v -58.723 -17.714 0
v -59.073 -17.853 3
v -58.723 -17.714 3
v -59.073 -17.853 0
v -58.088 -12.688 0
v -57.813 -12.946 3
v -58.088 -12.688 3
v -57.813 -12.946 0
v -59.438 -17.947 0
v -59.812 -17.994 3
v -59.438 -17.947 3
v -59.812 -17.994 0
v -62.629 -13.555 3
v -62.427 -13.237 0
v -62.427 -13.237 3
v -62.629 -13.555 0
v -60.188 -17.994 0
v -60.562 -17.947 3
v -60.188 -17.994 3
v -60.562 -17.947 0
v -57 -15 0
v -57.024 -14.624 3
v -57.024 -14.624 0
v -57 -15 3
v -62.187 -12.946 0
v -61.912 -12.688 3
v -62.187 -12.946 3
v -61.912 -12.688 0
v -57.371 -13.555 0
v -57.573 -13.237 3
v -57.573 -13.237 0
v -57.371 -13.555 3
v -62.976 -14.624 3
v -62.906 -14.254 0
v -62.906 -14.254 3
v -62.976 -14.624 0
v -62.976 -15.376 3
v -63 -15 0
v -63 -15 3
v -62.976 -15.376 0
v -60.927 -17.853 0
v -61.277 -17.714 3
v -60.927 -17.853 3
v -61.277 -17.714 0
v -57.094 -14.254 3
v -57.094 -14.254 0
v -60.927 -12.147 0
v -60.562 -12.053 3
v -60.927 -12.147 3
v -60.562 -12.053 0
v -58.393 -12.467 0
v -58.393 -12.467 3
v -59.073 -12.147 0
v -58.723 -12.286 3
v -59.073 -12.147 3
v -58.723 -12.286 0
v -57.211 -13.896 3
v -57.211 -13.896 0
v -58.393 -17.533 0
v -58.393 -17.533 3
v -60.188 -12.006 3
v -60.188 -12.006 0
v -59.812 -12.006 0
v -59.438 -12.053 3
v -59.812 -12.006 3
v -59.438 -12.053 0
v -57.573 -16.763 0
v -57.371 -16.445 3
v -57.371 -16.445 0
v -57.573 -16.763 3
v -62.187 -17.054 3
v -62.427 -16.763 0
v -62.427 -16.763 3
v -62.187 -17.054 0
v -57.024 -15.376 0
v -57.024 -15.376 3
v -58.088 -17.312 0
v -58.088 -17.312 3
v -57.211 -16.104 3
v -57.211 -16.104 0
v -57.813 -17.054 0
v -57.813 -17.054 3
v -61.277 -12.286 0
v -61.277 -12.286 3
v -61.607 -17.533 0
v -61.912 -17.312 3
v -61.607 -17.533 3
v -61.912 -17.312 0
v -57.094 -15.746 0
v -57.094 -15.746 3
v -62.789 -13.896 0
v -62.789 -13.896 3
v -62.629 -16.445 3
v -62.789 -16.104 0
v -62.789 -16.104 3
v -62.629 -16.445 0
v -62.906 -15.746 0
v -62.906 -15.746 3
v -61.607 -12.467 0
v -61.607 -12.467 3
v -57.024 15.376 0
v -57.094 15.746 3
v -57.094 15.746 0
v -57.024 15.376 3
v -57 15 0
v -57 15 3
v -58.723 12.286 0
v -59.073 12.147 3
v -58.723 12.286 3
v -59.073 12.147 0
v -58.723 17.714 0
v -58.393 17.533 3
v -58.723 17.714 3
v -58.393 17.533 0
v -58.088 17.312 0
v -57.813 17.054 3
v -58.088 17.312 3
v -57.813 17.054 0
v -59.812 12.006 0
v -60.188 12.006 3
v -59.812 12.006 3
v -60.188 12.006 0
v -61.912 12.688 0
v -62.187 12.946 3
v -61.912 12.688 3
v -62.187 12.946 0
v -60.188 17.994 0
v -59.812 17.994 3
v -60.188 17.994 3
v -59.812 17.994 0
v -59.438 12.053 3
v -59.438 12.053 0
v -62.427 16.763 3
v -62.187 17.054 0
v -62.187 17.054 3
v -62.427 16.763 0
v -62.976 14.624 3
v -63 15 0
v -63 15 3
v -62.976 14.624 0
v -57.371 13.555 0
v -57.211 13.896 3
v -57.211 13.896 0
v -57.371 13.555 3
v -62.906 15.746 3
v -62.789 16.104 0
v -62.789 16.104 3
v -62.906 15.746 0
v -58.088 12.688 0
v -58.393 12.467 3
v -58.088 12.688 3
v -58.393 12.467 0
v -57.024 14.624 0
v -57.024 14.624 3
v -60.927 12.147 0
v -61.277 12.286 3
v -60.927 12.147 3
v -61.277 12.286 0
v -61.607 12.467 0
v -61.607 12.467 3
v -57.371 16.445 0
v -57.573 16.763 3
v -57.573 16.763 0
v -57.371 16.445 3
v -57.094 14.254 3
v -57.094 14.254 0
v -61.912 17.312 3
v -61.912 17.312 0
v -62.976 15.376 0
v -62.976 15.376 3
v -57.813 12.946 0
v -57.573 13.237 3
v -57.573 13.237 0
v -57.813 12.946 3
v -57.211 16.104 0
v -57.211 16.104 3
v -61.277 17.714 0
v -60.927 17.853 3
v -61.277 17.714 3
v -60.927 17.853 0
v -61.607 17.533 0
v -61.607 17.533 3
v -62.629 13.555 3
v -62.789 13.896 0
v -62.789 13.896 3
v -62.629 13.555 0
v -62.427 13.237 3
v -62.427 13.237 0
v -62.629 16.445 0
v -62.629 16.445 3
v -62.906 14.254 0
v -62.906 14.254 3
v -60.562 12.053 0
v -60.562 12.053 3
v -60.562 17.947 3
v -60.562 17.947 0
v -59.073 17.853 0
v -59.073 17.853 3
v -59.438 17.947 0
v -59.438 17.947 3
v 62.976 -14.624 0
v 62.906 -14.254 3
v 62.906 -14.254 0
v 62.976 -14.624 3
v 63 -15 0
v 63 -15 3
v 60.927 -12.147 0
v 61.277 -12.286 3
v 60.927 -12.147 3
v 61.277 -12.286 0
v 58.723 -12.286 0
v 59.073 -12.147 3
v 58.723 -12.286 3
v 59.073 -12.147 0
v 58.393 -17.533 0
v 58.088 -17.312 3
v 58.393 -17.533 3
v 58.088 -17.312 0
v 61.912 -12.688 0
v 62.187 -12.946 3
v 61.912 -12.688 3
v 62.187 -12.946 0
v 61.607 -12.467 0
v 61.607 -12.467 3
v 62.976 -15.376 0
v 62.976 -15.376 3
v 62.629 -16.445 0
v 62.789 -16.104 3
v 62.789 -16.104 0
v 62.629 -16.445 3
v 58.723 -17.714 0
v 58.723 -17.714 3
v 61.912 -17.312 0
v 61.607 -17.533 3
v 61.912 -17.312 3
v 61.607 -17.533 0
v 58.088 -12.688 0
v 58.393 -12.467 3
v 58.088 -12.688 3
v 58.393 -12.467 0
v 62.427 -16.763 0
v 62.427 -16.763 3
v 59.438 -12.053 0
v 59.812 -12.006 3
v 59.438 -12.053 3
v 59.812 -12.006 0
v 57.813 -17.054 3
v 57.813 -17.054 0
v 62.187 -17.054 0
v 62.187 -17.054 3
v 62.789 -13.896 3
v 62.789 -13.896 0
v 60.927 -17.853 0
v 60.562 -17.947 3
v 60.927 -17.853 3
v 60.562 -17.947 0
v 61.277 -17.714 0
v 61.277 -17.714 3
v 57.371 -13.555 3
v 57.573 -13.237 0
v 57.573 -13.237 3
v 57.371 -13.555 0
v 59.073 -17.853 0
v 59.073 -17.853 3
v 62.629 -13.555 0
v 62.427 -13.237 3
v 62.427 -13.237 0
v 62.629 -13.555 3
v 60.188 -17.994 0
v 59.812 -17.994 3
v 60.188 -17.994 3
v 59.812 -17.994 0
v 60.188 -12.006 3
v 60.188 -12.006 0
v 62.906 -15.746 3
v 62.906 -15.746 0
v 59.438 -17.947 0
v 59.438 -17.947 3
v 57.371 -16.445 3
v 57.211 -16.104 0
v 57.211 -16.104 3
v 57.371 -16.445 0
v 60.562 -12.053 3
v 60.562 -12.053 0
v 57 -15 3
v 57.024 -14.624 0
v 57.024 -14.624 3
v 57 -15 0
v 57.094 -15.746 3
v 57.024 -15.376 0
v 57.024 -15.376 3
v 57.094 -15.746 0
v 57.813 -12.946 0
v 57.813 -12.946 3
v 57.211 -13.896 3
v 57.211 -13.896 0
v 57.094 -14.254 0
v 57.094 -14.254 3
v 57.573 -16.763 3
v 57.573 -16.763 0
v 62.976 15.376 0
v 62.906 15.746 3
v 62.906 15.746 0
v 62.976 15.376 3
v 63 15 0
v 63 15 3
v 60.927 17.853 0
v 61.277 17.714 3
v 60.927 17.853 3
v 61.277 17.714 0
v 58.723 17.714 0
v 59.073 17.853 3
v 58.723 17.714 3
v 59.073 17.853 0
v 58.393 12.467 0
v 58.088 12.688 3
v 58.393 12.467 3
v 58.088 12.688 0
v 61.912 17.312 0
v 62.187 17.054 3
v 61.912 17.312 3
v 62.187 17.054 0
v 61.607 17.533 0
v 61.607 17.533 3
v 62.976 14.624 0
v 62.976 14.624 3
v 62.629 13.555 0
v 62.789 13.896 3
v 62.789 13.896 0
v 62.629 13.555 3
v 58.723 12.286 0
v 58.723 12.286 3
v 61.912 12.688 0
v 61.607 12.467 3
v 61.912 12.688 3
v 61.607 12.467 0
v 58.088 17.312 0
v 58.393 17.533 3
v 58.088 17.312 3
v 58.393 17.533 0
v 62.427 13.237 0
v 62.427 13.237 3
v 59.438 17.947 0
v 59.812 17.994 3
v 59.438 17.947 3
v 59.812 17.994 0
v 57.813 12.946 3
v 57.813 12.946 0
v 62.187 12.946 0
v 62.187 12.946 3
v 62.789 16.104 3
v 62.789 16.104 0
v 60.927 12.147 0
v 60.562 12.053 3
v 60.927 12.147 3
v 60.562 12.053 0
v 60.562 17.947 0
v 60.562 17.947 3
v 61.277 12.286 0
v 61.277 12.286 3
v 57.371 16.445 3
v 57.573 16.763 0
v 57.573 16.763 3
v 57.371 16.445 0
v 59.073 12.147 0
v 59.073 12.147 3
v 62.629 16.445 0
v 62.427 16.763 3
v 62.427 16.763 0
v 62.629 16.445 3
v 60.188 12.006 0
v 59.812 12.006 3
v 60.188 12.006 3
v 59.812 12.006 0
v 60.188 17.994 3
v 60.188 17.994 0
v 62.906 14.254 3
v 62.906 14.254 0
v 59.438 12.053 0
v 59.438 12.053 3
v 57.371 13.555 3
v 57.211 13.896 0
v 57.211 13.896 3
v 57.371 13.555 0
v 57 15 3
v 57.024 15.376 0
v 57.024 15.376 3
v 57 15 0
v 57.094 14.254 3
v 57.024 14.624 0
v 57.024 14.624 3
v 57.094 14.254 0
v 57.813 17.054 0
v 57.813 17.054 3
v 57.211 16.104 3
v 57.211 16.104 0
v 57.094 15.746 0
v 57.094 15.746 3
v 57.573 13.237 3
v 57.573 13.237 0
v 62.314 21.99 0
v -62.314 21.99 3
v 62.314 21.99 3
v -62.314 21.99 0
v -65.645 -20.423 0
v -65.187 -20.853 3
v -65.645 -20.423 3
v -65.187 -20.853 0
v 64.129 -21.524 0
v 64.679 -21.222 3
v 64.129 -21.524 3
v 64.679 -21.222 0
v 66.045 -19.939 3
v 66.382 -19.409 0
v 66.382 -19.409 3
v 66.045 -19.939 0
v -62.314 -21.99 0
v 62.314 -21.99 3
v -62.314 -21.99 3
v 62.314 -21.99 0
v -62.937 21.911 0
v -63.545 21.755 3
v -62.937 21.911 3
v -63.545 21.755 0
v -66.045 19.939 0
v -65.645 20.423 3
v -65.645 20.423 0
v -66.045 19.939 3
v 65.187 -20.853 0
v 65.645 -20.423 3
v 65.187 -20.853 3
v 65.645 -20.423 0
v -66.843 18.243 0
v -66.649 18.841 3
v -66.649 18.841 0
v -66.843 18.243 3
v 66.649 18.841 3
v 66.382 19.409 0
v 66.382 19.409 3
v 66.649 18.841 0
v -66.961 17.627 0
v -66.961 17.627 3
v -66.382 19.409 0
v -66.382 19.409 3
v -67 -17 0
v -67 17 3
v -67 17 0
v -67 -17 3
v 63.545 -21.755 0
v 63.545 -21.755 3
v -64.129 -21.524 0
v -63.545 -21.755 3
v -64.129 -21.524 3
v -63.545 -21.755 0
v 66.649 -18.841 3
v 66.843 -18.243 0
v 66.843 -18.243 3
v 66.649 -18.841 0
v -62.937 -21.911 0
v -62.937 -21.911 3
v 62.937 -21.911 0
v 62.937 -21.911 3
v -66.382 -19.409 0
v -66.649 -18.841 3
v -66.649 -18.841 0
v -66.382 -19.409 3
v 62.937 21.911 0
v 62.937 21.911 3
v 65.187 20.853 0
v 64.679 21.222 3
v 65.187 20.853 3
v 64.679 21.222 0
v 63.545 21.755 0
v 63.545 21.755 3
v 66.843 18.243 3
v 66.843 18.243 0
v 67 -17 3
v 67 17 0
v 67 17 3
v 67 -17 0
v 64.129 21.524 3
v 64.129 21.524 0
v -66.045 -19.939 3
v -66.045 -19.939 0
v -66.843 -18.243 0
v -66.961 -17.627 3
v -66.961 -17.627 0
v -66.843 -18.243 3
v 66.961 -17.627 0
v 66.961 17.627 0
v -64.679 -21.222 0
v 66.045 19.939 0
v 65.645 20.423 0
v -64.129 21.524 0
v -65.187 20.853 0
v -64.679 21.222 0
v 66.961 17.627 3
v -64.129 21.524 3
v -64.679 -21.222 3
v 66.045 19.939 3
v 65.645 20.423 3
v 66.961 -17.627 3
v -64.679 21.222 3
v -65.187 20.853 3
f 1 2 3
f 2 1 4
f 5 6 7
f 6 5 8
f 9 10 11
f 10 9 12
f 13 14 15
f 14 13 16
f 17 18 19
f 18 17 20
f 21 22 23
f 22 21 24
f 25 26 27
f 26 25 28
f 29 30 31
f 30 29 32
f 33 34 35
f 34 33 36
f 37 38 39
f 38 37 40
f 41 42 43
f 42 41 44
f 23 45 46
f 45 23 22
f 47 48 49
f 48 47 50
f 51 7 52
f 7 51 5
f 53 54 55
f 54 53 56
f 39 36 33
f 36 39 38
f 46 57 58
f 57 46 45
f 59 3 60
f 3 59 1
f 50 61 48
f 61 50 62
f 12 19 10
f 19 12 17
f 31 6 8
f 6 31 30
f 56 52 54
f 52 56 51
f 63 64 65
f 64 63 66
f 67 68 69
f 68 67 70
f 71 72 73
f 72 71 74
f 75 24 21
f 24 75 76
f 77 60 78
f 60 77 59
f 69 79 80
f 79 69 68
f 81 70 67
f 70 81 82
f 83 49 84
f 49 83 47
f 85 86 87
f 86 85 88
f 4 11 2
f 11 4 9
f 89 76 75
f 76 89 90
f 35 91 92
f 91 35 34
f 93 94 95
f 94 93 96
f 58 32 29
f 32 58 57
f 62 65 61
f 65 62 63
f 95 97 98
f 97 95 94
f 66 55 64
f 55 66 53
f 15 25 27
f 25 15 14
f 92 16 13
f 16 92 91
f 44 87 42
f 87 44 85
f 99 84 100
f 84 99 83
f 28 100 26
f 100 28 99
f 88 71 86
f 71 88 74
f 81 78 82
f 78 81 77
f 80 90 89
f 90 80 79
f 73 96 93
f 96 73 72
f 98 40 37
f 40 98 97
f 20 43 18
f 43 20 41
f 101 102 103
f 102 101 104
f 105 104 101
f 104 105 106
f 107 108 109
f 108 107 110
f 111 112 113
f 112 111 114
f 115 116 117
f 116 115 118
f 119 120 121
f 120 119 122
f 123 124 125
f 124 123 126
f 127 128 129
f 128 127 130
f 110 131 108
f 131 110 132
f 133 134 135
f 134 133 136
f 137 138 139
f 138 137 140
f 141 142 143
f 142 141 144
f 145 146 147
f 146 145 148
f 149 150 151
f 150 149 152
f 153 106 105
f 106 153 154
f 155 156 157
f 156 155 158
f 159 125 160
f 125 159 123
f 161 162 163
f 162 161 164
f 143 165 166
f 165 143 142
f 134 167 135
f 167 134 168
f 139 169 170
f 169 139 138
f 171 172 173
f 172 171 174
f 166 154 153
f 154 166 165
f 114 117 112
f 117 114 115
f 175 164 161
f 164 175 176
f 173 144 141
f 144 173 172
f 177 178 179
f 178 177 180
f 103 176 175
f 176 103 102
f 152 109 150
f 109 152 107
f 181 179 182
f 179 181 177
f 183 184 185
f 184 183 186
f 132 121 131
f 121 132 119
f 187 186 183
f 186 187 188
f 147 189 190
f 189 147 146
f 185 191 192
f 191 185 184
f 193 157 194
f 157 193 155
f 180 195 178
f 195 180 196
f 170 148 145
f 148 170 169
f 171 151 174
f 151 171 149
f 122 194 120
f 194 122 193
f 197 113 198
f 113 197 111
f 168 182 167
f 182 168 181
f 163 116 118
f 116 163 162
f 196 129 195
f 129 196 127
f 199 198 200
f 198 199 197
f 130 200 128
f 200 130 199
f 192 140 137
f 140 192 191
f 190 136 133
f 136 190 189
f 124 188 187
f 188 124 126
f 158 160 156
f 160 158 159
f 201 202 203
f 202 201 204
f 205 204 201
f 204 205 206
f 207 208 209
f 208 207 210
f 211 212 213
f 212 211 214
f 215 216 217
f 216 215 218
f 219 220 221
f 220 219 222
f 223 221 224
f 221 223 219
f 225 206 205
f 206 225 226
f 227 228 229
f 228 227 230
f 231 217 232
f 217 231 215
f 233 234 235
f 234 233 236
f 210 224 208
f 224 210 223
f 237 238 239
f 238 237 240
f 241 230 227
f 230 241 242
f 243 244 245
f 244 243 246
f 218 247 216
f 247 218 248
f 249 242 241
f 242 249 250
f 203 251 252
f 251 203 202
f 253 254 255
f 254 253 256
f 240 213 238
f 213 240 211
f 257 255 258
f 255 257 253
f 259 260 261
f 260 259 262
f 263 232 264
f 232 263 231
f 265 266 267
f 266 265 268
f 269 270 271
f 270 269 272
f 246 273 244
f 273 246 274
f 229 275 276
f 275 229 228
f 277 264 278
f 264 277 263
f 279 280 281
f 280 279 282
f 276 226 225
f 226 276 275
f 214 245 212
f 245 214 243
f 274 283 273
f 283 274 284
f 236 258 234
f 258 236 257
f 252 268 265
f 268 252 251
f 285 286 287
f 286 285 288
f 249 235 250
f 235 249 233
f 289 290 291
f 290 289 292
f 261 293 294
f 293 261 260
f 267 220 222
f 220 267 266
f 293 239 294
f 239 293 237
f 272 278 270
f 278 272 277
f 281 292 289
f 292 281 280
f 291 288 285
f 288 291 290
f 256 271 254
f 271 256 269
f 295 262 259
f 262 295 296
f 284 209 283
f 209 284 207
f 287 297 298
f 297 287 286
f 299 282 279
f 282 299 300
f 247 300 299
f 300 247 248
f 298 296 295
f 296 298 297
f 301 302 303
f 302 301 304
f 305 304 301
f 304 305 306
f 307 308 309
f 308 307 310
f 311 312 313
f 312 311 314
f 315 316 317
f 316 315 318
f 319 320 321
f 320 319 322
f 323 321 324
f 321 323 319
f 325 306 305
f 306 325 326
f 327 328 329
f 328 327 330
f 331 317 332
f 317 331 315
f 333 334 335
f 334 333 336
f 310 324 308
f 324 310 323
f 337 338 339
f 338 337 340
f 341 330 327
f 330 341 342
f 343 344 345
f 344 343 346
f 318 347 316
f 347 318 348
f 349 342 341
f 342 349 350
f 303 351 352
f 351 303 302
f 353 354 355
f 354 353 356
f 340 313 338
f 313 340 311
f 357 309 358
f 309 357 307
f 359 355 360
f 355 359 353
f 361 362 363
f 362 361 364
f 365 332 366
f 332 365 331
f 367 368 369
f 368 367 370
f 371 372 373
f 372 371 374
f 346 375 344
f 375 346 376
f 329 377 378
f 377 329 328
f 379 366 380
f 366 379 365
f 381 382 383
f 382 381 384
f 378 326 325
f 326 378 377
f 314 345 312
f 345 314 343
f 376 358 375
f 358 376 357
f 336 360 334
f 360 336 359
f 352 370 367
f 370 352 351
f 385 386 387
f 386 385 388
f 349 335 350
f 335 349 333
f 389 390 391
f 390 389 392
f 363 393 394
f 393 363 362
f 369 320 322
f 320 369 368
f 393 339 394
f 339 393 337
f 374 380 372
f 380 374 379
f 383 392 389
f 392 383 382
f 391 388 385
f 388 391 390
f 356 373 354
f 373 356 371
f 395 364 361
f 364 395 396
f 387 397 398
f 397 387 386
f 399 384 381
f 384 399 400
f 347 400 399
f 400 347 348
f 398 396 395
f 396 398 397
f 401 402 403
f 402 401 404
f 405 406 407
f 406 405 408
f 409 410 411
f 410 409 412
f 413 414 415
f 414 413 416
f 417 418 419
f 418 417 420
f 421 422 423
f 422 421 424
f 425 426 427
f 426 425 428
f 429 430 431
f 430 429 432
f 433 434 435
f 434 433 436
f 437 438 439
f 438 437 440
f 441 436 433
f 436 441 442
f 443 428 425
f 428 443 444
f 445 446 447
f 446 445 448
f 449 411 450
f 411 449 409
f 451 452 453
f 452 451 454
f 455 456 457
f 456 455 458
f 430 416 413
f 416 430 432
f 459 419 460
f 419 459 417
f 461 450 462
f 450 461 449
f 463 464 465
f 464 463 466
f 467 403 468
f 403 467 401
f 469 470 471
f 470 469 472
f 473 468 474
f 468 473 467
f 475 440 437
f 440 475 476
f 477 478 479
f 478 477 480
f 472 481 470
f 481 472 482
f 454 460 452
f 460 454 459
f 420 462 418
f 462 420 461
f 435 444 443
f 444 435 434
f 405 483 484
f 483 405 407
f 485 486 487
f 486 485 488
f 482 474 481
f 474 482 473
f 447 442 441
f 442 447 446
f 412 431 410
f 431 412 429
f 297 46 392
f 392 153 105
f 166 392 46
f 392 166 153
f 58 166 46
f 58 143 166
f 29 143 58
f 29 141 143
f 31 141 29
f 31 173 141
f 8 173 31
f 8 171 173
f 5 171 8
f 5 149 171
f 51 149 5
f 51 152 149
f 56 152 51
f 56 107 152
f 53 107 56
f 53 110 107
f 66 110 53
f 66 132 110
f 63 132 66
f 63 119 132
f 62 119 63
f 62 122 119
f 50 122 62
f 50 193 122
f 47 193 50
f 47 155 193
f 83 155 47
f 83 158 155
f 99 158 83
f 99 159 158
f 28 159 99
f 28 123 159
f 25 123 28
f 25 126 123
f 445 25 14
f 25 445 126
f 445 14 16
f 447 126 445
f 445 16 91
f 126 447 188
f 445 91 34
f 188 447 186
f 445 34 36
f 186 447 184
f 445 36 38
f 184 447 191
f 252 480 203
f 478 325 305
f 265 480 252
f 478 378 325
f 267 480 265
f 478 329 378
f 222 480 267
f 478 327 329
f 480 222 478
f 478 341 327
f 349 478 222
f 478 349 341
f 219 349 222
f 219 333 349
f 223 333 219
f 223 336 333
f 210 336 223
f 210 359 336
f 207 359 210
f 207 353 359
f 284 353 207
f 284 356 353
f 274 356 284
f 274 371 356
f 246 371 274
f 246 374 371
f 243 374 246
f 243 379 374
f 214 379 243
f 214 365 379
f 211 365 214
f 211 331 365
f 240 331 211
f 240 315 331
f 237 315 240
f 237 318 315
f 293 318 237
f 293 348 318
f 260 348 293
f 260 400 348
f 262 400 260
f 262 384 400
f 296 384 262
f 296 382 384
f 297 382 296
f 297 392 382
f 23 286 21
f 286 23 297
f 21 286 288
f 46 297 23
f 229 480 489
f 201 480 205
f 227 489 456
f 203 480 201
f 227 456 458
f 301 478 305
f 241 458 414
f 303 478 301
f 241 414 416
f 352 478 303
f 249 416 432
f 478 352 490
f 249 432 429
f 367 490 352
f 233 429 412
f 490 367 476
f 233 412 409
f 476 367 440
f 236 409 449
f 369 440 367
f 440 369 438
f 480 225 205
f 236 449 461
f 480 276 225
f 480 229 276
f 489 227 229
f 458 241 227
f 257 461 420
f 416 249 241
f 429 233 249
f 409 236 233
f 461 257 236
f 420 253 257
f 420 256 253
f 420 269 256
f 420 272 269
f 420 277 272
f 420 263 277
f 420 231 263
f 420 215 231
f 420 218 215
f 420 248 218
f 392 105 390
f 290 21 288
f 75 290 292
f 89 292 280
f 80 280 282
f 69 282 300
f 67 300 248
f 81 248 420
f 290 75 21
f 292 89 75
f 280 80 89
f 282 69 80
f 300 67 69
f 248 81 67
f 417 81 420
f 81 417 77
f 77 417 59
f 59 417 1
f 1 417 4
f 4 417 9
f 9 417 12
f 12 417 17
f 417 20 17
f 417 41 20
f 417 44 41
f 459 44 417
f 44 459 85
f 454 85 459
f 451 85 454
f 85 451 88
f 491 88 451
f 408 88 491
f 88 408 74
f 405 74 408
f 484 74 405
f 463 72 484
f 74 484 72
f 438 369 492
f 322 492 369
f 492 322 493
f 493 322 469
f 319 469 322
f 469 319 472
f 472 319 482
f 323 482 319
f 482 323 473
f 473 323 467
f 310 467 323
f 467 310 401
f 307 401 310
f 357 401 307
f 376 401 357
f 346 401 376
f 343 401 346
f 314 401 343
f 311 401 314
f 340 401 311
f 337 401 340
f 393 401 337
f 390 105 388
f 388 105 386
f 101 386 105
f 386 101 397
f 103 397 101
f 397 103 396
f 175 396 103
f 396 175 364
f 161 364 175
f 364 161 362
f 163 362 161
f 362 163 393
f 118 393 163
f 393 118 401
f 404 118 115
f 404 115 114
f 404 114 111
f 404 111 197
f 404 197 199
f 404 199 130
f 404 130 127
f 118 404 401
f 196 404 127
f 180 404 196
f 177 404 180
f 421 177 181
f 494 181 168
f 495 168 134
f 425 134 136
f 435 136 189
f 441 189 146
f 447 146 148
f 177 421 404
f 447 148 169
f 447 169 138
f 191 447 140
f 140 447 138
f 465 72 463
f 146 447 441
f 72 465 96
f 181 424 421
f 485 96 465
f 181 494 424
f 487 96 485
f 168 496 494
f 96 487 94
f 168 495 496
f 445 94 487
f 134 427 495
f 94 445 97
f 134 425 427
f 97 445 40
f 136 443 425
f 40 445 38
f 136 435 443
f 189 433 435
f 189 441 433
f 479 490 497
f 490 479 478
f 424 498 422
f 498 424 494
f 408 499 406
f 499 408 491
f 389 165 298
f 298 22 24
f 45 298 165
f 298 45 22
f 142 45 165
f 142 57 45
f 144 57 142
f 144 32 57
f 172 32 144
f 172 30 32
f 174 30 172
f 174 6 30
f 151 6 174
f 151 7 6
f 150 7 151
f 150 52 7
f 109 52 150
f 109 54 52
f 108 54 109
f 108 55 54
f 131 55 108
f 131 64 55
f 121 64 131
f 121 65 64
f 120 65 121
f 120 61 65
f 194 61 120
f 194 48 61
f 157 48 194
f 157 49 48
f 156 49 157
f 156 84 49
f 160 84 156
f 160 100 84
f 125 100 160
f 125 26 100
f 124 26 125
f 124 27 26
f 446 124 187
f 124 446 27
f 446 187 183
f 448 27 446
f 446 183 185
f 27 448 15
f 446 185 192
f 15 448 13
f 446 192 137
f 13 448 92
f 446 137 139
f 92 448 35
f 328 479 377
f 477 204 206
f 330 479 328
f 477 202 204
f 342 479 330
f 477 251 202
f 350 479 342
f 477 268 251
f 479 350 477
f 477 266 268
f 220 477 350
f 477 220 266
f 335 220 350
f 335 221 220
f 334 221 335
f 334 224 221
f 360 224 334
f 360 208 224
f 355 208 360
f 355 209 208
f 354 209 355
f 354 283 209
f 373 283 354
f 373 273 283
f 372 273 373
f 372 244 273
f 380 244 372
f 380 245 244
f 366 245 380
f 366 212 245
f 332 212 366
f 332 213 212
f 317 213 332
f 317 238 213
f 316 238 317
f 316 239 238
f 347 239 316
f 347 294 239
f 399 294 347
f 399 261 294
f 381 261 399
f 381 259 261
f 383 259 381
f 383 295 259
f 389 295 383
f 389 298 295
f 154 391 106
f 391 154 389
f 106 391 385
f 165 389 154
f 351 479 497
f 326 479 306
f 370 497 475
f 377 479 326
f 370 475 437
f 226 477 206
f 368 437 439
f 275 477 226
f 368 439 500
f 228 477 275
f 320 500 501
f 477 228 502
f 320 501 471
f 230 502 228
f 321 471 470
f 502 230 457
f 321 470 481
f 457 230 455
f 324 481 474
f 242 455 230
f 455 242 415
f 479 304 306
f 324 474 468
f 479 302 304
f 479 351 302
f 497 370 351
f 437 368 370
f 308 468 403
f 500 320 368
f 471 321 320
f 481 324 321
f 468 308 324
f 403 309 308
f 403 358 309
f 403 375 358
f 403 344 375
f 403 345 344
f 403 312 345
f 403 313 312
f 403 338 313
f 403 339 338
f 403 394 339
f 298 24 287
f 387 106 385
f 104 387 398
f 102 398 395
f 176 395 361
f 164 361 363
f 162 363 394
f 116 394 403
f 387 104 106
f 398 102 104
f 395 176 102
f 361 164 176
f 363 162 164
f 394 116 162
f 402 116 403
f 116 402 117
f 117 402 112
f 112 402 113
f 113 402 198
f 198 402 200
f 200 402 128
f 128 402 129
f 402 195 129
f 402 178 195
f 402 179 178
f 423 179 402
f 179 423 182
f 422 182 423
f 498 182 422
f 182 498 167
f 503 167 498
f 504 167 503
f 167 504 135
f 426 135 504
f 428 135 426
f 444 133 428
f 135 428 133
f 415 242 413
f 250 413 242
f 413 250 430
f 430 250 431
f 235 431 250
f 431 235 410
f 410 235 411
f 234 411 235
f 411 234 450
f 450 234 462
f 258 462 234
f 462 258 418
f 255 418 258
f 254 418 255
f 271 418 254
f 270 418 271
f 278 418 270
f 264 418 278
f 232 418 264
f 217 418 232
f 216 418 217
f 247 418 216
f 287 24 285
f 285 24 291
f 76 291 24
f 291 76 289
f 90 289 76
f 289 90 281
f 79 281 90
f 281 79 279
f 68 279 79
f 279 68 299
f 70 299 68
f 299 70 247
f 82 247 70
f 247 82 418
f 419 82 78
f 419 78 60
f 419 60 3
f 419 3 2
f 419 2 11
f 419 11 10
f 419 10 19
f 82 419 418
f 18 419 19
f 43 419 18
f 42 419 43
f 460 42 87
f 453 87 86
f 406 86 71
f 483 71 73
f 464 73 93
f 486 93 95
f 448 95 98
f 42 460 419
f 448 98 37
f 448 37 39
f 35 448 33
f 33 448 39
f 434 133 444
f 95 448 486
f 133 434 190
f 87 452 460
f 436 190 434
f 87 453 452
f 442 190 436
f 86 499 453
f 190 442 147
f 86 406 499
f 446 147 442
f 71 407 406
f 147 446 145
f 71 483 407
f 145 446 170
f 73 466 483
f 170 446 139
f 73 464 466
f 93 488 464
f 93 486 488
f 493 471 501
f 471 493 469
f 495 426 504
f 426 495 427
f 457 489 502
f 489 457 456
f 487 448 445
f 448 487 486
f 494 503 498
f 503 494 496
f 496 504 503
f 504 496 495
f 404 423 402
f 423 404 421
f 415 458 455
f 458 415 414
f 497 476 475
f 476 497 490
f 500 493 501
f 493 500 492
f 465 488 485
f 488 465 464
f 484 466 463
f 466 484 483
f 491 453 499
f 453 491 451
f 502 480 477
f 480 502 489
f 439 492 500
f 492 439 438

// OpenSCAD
$fn = 50;


difference() {
	union() {
		hull() {
			translate(v = [-62.0000000000, 17.0000000000, 0]) {
				cylinder(h = 3, r = 5);
			}
			translate(v = [62.0000000000, 17.0000000000, 0]) {
				cylinder(h = 3, r = 5);
			}
			translate(v = [-62.0000000000, -17.0000000000, 0]) {
				cylinder(h = 3, r = 5);
			}
			translate(v = [62.0000000000, -17.0000000000, 0]) {
				cylinder(h = 3, r = 5);
			}
		}
	}
	union() {
		translate(v = [-60.0000000000, -15.0000000000, -100.0000000000]) {
			cylinder(h = 200, r = 3.0000000000);
		}
		translate(v = [-60.0000000000, 15.0000000000, -100.0000000000]) {
			cylinder(h = 200, r = 3.0000000000);
		}
		translate(v = [60.0000000000, -15.0000000000, -100.0000000000]) {
			cylinder(h = 200, r = 3.0000000000);
		}
		translate(v = [60.0000000000, 15.0000000000, -100.0000000000]) {
			cylinder(h = 200, r = 3.0000000000);
		}
	}
}
